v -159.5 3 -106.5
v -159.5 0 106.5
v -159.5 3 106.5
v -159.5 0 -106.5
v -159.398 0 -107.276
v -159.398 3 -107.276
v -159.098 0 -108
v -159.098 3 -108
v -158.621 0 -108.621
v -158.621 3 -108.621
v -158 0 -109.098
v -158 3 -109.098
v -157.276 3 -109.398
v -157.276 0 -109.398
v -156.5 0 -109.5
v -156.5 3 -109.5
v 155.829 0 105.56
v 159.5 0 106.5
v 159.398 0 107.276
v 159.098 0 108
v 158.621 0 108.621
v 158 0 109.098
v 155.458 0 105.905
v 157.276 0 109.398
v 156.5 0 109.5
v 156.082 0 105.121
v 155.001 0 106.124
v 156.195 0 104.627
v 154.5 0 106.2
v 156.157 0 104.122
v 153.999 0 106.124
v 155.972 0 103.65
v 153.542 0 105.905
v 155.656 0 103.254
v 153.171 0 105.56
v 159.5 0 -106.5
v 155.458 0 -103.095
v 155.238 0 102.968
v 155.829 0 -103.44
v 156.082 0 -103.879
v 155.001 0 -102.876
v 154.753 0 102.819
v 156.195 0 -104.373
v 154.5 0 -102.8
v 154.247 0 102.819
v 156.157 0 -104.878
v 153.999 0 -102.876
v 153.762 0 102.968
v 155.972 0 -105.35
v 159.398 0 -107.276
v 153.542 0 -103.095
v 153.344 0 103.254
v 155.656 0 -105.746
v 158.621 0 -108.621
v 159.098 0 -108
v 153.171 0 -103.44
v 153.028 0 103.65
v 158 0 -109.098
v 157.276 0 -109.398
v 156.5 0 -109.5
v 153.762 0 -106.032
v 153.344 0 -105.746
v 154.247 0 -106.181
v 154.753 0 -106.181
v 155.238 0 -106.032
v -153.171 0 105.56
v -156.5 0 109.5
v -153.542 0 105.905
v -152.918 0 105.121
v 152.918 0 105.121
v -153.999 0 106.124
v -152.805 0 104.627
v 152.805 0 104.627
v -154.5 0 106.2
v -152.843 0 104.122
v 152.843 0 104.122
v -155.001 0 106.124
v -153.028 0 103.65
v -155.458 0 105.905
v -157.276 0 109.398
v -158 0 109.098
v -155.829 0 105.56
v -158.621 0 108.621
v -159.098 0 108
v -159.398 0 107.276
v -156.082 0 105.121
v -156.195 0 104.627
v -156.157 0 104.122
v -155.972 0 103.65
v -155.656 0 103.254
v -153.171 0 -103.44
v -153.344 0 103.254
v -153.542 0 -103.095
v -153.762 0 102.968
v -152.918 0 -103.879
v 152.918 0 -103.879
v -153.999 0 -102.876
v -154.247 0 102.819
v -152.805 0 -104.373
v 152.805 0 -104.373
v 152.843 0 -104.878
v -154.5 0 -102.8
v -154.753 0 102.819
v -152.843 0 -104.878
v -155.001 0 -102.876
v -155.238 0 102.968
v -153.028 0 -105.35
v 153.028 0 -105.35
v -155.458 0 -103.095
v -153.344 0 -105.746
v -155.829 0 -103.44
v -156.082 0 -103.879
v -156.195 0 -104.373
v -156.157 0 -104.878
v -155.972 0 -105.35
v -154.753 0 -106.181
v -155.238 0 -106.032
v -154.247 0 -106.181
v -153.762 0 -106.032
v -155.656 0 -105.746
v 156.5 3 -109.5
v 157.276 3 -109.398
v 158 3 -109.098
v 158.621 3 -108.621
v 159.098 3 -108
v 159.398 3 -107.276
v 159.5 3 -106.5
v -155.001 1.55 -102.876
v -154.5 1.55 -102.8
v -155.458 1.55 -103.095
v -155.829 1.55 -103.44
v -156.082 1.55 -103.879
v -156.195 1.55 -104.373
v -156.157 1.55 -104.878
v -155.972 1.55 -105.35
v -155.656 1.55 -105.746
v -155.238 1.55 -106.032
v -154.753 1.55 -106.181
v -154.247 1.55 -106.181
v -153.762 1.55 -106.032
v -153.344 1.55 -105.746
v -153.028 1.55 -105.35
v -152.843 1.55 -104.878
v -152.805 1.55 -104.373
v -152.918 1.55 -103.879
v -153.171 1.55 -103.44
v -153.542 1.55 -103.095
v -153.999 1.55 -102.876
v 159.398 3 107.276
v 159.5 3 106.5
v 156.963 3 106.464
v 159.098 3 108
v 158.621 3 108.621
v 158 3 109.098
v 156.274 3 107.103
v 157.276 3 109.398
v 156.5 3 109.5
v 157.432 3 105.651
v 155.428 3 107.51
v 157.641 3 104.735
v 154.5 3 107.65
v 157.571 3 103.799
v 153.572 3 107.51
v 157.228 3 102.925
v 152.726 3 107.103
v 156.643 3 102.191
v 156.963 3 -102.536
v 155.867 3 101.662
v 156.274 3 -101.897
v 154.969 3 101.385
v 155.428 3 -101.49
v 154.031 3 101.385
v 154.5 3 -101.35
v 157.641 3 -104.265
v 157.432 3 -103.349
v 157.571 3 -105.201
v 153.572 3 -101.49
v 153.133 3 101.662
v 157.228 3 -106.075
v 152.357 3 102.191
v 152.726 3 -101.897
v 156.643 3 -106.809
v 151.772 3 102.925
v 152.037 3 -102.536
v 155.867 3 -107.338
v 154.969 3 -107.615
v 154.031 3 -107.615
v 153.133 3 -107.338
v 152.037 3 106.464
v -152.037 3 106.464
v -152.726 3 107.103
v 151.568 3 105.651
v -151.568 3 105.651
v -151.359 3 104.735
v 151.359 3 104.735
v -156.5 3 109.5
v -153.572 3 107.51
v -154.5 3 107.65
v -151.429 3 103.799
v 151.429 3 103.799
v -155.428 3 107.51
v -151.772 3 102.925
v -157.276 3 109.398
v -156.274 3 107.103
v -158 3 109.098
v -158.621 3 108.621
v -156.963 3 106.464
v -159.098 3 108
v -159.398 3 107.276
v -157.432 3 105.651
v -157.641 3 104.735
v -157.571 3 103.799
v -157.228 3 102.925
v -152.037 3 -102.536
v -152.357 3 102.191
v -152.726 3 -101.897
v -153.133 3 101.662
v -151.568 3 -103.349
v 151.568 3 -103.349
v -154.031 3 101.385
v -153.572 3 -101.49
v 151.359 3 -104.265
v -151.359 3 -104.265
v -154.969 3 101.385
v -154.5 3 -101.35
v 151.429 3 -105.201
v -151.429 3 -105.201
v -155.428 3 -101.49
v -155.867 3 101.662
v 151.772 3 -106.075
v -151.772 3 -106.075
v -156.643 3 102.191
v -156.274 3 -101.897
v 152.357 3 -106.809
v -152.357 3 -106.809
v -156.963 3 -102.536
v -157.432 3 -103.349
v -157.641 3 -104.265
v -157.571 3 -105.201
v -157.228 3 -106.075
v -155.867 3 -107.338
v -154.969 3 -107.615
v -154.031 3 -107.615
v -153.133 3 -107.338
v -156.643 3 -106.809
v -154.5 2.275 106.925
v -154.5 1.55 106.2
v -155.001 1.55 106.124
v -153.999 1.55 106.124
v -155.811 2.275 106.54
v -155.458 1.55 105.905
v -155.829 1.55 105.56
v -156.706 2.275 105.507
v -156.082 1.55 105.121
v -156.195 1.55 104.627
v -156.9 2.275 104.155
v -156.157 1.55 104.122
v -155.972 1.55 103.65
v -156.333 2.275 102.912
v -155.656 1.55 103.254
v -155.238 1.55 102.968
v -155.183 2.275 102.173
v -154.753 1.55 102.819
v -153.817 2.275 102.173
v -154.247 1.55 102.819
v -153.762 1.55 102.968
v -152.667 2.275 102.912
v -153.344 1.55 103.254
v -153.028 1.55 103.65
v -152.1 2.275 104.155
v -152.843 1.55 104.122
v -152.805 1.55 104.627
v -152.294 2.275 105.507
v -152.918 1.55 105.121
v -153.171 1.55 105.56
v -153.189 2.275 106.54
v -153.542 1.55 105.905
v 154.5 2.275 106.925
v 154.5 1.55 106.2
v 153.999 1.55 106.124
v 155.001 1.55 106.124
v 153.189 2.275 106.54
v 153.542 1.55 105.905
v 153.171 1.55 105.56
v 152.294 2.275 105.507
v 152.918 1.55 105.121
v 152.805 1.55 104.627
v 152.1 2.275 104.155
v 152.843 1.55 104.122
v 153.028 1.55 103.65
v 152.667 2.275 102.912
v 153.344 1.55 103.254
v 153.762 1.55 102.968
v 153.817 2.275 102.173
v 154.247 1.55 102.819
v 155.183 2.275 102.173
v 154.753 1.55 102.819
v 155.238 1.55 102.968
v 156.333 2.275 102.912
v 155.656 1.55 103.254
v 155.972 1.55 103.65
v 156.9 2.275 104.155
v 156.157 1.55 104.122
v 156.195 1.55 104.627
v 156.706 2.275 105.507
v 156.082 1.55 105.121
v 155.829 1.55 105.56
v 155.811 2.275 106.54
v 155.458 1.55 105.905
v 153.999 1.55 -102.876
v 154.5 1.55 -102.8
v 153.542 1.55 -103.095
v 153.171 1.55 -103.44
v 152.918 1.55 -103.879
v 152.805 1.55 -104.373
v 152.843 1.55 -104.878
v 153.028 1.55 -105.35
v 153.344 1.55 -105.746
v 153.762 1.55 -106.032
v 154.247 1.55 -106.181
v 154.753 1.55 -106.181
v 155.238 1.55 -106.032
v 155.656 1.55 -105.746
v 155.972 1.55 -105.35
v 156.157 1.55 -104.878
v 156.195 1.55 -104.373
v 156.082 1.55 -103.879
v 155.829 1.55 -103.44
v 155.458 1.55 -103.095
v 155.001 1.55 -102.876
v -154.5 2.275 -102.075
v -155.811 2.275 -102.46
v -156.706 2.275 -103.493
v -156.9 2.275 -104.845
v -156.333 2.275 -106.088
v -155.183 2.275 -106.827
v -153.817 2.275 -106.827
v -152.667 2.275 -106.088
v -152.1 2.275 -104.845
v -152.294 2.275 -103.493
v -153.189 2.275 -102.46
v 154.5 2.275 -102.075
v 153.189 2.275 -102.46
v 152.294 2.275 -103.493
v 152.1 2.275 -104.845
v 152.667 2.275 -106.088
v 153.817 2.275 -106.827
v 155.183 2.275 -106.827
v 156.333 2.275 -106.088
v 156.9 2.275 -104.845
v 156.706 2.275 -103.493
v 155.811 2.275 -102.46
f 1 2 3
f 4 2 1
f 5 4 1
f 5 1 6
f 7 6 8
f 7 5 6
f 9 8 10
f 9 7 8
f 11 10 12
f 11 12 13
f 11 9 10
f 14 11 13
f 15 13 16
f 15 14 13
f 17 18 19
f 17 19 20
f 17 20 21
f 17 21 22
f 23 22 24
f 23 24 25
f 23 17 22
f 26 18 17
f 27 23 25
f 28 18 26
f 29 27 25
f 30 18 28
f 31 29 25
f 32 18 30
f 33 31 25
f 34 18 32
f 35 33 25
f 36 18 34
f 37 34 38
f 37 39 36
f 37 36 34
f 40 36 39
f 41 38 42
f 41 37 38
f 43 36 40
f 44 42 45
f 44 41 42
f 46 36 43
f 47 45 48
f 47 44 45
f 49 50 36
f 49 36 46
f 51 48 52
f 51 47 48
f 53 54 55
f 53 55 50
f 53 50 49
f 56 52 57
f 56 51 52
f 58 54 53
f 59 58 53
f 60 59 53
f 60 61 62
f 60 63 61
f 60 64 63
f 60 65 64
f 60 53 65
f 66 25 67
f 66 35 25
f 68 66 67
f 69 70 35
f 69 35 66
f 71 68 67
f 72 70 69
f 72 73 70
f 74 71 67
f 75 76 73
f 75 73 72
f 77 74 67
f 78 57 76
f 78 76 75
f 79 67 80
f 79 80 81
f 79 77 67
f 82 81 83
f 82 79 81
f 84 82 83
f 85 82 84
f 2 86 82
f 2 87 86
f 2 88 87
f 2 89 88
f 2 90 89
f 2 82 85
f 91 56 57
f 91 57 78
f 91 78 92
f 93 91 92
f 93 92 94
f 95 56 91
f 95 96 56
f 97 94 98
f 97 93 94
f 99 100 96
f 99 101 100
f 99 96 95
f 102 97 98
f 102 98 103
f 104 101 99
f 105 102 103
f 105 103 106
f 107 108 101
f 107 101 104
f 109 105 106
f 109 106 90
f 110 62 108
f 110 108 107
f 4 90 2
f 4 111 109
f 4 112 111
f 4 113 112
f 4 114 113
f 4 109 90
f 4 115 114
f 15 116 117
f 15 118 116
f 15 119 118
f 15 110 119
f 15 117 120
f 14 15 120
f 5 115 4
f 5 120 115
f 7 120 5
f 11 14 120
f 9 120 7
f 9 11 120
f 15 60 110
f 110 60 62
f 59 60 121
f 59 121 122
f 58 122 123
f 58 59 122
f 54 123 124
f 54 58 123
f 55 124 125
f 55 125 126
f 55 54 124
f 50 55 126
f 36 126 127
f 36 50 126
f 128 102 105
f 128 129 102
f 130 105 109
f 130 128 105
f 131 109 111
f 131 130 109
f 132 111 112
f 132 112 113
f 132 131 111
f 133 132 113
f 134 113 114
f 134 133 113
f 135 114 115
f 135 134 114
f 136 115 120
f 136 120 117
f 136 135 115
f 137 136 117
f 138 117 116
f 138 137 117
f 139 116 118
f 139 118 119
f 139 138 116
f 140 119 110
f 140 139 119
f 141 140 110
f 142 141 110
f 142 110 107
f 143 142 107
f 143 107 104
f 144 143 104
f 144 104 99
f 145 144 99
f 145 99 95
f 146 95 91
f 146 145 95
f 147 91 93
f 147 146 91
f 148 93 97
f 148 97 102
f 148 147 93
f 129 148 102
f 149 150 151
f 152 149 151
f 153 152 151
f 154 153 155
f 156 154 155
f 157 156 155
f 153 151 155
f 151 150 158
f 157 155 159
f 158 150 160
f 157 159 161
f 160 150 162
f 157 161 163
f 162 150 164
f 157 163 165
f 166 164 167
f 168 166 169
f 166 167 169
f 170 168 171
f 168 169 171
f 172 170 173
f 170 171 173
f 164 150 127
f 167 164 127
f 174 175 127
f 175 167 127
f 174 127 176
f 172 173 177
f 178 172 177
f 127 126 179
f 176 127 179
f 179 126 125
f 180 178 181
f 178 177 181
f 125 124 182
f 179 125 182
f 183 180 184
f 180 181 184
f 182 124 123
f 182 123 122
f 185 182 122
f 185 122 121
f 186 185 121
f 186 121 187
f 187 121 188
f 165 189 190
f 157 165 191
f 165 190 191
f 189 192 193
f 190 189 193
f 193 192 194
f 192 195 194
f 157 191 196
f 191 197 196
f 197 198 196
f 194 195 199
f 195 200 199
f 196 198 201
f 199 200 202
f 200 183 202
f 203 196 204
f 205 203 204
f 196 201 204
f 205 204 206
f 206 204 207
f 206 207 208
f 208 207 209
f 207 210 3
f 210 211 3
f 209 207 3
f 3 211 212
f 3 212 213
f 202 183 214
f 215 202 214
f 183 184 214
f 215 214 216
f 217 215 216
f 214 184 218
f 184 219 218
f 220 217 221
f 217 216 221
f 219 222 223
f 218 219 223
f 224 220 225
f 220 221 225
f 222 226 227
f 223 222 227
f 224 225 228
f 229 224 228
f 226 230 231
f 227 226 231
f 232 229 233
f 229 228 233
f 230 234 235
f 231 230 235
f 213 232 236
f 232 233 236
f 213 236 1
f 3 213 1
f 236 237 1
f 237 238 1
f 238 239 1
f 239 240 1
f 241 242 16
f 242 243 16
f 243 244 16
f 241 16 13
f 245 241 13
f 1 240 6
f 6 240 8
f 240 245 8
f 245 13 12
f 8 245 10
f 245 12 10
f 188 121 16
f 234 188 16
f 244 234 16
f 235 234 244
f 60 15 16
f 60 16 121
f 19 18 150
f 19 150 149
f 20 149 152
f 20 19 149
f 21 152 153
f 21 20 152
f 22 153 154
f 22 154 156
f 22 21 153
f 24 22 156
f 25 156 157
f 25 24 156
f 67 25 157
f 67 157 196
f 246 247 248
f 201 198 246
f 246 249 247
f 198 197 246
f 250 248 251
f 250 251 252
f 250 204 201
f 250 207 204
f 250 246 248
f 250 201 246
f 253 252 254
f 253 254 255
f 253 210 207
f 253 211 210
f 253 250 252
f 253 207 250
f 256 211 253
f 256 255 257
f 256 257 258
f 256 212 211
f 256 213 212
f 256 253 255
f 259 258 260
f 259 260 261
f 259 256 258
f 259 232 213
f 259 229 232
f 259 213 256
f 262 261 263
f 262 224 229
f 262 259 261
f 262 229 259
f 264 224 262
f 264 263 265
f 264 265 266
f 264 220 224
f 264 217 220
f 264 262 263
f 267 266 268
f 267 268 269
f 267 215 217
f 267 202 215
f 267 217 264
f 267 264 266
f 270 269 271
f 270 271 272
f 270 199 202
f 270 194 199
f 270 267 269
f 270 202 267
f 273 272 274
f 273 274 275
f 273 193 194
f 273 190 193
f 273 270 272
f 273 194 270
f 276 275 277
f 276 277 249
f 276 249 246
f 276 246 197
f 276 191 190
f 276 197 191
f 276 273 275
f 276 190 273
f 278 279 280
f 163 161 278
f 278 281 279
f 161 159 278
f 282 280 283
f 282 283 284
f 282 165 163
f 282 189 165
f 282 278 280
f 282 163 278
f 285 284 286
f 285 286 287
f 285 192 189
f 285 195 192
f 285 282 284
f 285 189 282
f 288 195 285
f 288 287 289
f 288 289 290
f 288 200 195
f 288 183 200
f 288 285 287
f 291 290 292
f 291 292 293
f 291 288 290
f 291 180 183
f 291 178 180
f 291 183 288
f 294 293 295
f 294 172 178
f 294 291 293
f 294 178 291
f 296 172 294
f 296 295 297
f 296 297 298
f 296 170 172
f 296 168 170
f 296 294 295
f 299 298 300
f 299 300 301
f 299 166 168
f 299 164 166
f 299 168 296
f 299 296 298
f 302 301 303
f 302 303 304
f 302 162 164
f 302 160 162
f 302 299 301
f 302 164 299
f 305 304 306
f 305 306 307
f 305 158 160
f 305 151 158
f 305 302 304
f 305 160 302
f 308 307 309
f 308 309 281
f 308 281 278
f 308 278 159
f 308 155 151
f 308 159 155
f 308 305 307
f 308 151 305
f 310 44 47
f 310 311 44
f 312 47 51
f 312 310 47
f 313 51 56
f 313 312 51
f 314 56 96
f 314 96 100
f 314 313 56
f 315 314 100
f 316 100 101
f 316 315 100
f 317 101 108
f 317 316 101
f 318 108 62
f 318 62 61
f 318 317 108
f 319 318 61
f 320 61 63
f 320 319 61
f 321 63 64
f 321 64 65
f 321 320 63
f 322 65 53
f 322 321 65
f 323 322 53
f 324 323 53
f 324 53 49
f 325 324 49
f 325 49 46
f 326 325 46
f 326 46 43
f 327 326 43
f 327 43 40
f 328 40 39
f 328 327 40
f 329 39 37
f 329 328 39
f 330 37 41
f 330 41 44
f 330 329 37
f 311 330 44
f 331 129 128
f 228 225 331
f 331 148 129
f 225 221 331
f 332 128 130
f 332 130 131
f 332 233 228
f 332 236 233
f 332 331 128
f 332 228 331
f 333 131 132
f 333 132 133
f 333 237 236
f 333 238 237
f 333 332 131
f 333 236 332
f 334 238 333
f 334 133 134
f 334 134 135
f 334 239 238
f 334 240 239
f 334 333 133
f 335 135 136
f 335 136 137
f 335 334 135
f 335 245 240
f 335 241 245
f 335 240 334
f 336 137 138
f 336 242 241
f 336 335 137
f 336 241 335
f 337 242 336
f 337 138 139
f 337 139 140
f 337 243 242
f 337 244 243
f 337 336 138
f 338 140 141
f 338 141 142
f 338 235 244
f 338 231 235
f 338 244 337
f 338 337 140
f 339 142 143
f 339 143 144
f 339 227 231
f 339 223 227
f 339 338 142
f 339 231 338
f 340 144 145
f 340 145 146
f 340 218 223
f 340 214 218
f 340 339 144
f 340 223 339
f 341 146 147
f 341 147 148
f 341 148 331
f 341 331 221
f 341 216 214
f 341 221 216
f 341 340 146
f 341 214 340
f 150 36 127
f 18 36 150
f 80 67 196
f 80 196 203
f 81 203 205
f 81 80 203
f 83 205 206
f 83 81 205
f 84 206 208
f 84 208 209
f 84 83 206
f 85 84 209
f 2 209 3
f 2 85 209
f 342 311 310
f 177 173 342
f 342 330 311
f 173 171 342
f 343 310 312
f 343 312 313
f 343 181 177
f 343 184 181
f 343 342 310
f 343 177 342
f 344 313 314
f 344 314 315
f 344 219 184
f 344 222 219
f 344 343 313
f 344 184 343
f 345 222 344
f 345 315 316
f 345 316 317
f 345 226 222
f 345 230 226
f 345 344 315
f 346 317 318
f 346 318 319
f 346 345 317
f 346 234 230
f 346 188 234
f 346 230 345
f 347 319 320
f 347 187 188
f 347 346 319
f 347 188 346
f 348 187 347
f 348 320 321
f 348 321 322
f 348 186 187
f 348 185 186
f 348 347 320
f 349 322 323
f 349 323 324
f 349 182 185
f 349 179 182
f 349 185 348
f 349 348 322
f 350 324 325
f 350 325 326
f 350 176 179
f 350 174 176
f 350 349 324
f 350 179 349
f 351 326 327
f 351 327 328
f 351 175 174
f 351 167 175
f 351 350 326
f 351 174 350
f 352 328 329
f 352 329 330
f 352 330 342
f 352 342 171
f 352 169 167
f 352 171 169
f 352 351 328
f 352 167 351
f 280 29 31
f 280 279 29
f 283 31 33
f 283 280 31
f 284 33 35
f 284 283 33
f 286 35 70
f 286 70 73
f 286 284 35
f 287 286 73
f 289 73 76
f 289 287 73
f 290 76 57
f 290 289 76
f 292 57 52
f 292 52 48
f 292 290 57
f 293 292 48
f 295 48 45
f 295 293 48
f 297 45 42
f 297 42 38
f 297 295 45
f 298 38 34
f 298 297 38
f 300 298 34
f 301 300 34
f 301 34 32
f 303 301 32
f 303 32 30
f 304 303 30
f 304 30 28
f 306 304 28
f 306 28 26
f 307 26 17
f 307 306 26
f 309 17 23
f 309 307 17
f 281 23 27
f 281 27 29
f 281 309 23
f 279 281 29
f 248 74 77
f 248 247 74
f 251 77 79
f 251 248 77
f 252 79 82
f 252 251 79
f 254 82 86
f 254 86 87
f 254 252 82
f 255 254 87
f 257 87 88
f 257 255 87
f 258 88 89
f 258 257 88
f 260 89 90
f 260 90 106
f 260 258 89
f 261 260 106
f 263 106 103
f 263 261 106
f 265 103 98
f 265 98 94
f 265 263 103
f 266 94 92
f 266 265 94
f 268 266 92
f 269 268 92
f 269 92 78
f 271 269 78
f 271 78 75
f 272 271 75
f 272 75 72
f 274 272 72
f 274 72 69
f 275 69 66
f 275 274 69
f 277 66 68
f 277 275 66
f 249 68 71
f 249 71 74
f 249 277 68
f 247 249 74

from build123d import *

# Parameters (mm, degrees)
BOSS_EXTRUDE1_DEPTH                            = 3
CSK_FOR_M3_FLAT_HEAD_MACHINE_SCREW1_AT_2_COUNT = 2
CSK_FOR_M3_FLAT_HEAD_MACHINE_SCREW1_AT_2_PITCH = 209
CSK_FOR_M3_FLAT_HEAD_MACHINE_SCREW1_AT_3_COUNT = 2
CSK_FOR_M3_FLAT_HEAD_MACHINE_SCREW1_AT_3_PITCH = 373.044233302
CSK_FOR_M3_FLAT_HEAD_MACHINE_SCREW1_AT_4_COUNT = 2
CSK_FOR_M3_FLAT_HEAD_MACHINE_SCREW1_AT_4_PITCH = 309


with BuildPart() as part:
    # Sketch1 → Boss-Extrude1 (new body)
    with BuildSketch(Plane(origin=(0, 0, 0), x_dir=(1, 0, 0), z_dir=(0, 1, 0))):
        with BuildLine():
            Line((-156.5, 109.5), (156.5, 109.5))
            ThreePointArc((156.5, 109.5), (158.621320344, 108.621320344), (159.5, 106.5))
            Line((159.5, 106.5), (159.5, -106.5))
            ThreePointArc((159.5, -106.5), (158.621320344, -108.621320344), (156.5, -109.5))
            Line((156.5, -109.5), (-156.5, -109.5))
            ThreePointArc((-156.5, -109.5), (-158.621320344, -108.621320344), (-159.5, -106.5))
            Line((-159.5, -106.5), (-159.5, 106.5))
            ThreePointArc((-159.5, 106.5), (-158.621320344, 108.621320344), (-156.5, 109.5))
        make_face()
    extrude(amount=BOSS_EXTRUDE1_DEPTH)

    # Sketch3 → CSK for M3 Flat Head Machine Screw1 (revolve, cut)
    with BuildSketch(Plane(origin=(-154.5, 3, -104.5), x_dir=(0, 0, 1), z_dir=(1, 0, 0))):
        Polygon((0, 0), (0, 3), (1.7, 3), (1.7, 1.45), (3.15, 0), align=None)
    csk_for_m3_flat_head_machine_screw1 = revolve(axis=Axis((-154.5, 9.35, -104.5), (0, -1, 0)), mode=Mode.SUBTRACT)

    # CSK for M3 Flat Head Machine Screw1 at 2: CSK for M3 Flat Head Machine Screw1 ×2
    with Locations(*[(0, 0, i * CSK_FOR_M3_FLAT_HEAD_MACHINE_SCREW1_AT_2_PITCH) for i in range(1, CSK_FOR_M3_FLAT_HEAD_MACHINE_SCREW1_AT_2_COUNT)]):
        add(csk_for_m3_flat_head_machine_screw1, mode=Mode.SUBTRACT)

    # CSK for M3 Flat Head Machine Screw1 at 3: CSK for M3 Flat Head Machine Screw1 ×2
    with Locations(*[Vector(0.828320002, 0, 0.560255276) * (i * CSK_FOR_M3_FLAT_HEAD_MACHINE_SCREW1_AT_3_PITCH) for i in range(1, CSK_FOR_M3_FLAT_HEAD_MACHINE_SCREW1_AT_3_COUNT)]):
        add(csk_for_m3_flat_head_machine_screw1, mode=Mode.SUBTRACT)

    # CSK for M3 Flat Head Machine Screw1 at 4: CSK for M3 Flat Head Machine Screw1 ×2
    with Locations(*[(i * CSK_FOR_M3_FLAT_HEAD_MACHINE_SCREW1_AT_4_PITCH, 0, 0) for i in range(1, CSK_FOR_M3_FLAT_HEAD_MACHINE_SCREW1_AT_4_COUNT)]):
        add(csk_for_m3_flat_head_machine_screw1, mode=Mode.SUBTRACT)


solid = part.part
